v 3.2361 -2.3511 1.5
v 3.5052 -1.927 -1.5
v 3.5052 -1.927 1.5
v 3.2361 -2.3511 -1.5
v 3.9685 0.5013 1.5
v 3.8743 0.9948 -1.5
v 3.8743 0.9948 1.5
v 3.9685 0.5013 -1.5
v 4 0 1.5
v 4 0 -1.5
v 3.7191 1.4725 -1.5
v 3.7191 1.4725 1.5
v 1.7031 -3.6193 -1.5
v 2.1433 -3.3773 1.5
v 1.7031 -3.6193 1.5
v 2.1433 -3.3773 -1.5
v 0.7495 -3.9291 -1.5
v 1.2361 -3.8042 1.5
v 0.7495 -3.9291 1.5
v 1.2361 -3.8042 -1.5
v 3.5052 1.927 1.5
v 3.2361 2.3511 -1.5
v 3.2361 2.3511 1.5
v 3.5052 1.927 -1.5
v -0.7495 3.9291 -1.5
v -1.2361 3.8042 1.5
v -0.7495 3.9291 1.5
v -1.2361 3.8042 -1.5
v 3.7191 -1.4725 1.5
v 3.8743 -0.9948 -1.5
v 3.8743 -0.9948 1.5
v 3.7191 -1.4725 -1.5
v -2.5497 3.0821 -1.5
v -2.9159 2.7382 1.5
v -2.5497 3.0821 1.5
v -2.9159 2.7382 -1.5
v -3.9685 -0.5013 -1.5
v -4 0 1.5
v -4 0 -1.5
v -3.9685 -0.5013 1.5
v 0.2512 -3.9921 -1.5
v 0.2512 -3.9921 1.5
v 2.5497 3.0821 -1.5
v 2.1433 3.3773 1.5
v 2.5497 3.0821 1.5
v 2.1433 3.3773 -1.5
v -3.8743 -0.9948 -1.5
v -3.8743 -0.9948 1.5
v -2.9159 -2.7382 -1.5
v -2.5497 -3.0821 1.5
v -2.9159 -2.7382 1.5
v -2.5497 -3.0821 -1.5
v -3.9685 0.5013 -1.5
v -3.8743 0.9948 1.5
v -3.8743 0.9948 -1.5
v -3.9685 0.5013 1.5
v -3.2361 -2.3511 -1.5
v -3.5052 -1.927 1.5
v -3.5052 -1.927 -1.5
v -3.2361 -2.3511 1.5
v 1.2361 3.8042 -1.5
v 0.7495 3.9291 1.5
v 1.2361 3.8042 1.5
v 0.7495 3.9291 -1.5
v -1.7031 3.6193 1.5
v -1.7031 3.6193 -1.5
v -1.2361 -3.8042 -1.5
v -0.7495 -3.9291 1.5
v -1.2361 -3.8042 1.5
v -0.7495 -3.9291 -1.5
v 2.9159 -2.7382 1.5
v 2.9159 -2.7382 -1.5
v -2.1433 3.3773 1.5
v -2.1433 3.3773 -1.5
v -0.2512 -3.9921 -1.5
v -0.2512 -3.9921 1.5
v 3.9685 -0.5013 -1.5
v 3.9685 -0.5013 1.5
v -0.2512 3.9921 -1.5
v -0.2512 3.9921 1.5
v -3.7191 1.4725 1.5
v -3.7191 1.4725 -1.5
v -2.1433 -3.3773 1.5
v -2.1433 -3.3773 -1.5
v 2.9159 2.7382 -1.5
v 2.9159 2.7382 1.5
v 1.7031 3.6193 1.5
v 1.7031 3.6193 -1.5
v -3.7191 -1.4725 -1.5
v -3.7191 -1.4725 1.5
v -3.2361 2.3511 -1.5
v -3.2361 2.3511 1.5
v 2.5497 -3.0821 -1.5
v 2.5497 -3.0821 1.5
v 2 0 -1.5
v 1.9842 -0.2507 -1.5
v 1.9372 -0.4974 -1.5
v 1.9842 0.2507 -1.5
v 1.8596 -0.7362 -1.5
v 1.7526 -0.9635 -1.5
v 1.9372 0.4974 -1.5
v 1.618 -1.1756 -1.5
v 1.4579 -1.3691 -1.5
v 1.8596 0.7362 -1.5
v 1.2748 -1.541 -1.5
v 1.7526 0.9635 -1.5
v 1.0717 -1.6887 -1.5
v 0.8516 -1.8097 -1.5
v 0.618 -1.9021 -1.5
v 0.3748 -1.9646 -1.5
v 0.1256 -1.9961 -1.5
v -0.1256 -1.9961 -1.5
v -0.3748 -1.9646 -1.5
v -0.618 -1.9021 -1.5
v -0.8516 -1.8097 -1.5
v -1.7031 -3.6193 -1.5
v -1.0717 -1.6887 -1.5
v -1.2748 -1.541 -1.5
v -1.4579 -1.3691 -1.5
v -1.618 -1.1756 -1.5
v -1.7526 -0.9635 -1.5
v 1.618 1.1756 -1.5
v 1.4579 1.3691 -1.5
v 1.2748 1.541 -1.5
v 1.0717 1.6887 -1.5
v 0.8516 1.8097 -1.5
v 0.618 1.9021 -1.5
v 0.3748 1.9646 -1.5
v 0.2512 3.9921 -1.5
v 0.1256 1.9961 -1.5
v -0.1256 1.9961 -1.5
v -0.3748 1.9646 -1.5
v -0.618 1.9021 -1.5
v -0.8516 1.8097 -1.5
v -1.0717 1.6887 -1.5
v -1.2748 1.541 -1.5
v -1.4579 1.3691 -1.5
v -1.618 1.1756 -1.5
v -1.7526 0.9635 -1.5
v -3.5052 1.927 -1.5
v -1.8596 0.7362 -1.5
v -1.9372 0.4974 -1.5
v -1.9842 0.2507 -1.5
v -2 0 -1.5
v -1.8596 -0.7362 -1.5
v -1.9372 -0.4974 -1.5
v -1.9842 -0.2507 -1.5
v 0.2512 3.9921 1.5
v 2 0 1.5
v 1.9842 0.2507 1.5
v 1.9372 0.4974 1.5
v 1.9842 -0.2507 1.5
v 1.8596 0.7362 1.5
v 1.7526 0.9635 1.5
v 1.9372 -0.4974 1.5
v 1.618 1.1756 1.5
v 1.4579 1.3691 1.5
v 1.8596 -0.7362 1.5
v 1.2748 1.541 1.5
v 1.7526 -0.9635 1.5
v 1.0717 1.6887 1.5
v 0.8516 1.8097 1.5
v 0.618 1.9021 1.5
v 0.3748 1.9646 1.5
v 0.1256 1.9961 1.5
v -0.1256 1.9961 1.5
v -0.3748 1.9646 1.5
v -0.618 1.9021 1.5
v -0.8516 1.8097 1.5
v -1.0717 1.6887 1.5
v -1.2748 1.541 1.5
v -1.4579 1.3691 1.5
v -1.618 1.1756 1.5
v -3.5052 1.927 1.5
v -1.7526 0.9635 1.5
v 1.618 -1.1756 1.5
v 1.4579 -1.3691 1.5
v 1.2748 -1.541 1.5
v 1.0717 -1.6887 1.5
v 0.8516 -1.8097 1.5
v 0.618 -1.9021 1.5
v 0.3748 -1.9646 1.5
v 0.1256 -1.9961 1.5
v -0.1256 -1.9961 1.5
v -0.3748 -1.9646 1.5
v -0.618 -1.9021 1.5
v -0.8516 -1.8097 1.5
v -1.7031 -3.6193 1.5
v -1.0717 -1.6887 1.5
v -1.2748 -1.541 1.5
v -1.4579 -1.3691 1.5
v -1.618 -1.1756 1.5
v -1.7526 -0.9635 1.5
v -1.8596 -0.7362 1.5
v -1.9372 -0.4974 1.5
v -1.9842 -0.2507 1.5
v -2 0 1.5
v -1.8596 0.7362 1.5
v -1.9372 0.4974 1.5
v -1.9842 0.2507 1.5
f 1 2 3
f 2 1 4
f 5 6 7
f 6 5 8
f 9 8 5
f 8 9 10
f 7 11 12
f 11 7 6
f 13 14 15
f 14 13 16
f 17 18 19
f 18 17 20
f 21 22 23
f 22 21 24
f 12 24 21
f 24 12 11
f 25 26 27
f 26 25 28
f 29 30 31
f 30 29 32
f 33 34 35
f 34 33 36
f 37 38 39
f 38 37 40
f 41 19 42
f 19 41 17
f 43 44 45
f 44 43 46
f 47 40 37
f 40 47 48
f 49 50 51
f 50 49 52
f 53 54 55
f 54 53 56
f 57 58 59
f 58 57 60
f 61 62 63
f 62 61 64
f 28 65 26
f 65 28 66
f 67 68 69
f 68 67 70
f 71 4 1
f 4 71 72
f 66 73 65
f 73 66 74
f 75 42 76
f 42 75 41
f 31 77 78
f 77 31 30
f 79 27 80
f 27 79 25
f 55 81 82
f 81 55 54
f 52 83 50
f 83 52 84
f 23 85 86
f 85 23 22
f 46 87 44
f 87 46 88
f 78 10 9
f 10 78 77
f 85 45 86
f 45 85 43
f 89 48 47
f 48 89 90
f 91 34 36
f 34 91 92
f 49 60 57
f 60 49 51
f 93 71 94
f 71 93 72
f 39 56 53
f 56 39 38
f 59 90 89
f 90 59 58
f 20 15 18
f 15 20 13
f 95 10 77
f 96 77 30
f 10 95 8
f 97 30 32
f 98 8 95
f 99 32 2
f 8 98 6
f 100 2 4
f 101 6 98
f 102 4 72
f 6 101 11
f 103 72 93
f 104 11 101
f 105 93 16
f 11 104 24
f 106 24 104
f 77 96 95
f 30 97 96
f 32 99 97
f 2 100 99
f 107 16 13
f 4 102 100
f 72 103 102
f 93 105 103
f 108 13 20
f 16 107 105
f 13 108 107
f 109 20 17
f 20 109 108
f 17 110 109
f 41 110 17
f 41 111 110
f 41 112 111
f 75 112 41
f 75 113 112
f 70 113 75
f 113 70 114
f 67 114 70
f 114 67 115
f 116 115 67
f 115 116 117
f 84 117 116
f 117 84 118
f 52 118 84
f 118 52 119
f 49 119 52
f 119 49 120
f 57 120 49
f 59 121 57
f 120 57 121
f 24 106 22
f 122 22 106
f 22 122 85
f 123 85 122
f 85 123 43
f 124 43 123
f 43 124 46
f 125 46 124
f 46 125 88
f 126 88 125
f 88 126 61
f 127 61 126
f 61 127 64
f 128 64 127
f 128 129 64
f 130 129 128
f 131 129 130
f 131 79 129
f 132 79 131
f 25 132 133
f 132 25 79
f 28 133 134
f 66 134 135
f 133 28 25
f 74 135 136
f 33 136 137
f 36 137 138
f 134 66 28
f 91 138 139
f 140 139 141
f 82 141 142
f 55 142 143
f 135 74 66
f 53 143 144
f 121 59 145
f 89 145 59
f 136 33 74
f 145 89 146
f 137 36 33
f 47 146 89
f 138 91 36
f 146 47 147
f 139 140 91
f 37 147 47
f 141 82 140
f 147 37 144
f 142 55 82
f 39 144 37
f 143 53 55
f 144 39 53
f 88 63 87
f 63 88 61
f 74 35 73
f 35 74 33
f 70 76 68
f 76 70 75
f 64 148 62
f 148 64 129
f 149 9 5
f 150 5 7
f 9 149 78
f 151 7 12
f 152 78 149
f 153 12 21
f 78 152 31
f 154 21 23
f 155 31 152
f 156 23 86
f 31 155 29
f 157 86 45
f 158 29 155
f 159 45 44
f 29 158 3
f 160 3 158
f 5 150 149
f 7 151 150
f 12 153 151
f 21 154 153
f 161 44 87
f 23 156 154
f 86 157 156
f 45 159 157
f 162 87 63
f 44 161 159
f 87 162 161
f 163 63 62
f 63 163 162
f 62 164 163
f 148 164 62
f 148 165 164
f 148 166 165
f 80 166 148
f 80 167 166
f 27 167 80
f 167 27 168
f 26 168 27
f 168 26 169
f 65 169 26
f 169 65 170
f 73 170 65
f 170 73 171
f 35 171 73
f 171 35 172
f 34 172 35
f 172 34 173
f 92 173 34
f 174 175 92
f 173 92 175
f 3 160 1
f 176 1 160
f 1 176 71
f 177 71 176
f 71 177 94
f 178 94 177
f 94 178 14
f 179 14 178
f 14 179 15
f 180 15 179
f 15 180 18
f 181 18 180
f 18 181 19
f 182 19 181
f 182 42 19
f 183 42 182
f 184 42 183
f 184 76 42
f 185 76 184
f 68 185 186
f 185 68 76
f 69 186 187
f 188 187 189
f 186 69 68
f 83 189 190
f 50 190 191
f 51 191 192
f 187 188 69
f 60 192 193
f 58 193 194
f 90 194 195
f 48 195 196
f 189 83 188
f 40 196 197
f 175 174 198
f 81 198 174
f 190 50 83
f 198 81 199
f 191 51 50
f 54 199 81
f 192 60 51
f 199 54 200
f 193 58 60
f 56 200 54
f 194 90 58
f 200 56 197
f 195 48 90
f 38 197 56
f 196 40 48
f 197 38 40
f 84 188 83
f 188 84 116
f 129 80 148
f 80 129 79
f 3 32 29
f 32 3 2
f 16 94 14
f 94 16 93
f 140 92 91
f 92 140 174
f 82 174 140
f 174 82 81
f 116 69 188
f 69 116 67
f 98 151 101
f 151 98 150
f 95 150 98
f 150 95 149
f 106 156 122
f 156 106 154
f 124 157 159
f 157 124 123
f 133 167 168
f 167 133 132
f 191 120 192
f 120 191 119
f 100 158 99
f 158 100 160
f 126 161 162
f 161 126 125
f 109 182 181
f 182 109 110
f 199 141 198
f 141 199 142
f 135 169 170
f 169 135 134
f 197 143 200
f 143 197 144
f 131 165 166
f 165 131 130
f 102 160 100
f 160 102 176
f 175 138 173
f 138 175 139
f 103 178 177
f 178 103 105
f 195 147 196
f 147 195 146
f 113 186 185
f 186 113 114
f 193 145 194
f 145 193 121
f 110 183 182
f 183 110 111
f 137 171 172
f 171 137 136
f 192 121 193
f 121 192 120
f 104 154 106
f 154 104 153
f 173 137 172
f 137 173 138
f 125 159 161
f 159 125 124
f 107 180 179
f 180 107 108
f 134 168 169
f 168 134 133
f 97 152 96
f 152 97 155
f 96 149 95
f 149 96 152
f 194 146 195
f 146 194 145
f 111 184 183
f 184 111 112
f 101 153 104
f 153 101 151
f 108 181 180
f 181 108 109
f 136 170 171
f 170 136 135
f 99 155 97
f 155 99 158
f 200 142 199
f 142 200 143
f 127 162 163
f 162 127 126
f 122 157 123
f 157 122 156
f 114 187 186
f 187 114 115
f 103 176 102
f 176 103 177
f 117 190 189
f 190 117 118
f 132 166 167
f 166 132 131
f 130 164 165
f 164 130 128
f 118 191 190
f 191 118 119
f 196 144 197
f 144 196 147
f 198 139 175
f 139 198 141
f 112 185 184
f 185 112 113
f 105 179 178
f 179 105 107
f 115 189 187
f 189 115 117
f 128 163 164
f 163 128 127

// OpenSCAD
$fn = 50;


difference() {
	union() {
		translate(v = [0, 0, -1.5000000000]) {
			cylinder(h = 3, r = 4.0000000000);
		}
	}
	union() {
		translate(v = [0, 0, -100.0000000000]) {
			cylinder(h = 200, r = 2.0000000000);
		}
	}
}
